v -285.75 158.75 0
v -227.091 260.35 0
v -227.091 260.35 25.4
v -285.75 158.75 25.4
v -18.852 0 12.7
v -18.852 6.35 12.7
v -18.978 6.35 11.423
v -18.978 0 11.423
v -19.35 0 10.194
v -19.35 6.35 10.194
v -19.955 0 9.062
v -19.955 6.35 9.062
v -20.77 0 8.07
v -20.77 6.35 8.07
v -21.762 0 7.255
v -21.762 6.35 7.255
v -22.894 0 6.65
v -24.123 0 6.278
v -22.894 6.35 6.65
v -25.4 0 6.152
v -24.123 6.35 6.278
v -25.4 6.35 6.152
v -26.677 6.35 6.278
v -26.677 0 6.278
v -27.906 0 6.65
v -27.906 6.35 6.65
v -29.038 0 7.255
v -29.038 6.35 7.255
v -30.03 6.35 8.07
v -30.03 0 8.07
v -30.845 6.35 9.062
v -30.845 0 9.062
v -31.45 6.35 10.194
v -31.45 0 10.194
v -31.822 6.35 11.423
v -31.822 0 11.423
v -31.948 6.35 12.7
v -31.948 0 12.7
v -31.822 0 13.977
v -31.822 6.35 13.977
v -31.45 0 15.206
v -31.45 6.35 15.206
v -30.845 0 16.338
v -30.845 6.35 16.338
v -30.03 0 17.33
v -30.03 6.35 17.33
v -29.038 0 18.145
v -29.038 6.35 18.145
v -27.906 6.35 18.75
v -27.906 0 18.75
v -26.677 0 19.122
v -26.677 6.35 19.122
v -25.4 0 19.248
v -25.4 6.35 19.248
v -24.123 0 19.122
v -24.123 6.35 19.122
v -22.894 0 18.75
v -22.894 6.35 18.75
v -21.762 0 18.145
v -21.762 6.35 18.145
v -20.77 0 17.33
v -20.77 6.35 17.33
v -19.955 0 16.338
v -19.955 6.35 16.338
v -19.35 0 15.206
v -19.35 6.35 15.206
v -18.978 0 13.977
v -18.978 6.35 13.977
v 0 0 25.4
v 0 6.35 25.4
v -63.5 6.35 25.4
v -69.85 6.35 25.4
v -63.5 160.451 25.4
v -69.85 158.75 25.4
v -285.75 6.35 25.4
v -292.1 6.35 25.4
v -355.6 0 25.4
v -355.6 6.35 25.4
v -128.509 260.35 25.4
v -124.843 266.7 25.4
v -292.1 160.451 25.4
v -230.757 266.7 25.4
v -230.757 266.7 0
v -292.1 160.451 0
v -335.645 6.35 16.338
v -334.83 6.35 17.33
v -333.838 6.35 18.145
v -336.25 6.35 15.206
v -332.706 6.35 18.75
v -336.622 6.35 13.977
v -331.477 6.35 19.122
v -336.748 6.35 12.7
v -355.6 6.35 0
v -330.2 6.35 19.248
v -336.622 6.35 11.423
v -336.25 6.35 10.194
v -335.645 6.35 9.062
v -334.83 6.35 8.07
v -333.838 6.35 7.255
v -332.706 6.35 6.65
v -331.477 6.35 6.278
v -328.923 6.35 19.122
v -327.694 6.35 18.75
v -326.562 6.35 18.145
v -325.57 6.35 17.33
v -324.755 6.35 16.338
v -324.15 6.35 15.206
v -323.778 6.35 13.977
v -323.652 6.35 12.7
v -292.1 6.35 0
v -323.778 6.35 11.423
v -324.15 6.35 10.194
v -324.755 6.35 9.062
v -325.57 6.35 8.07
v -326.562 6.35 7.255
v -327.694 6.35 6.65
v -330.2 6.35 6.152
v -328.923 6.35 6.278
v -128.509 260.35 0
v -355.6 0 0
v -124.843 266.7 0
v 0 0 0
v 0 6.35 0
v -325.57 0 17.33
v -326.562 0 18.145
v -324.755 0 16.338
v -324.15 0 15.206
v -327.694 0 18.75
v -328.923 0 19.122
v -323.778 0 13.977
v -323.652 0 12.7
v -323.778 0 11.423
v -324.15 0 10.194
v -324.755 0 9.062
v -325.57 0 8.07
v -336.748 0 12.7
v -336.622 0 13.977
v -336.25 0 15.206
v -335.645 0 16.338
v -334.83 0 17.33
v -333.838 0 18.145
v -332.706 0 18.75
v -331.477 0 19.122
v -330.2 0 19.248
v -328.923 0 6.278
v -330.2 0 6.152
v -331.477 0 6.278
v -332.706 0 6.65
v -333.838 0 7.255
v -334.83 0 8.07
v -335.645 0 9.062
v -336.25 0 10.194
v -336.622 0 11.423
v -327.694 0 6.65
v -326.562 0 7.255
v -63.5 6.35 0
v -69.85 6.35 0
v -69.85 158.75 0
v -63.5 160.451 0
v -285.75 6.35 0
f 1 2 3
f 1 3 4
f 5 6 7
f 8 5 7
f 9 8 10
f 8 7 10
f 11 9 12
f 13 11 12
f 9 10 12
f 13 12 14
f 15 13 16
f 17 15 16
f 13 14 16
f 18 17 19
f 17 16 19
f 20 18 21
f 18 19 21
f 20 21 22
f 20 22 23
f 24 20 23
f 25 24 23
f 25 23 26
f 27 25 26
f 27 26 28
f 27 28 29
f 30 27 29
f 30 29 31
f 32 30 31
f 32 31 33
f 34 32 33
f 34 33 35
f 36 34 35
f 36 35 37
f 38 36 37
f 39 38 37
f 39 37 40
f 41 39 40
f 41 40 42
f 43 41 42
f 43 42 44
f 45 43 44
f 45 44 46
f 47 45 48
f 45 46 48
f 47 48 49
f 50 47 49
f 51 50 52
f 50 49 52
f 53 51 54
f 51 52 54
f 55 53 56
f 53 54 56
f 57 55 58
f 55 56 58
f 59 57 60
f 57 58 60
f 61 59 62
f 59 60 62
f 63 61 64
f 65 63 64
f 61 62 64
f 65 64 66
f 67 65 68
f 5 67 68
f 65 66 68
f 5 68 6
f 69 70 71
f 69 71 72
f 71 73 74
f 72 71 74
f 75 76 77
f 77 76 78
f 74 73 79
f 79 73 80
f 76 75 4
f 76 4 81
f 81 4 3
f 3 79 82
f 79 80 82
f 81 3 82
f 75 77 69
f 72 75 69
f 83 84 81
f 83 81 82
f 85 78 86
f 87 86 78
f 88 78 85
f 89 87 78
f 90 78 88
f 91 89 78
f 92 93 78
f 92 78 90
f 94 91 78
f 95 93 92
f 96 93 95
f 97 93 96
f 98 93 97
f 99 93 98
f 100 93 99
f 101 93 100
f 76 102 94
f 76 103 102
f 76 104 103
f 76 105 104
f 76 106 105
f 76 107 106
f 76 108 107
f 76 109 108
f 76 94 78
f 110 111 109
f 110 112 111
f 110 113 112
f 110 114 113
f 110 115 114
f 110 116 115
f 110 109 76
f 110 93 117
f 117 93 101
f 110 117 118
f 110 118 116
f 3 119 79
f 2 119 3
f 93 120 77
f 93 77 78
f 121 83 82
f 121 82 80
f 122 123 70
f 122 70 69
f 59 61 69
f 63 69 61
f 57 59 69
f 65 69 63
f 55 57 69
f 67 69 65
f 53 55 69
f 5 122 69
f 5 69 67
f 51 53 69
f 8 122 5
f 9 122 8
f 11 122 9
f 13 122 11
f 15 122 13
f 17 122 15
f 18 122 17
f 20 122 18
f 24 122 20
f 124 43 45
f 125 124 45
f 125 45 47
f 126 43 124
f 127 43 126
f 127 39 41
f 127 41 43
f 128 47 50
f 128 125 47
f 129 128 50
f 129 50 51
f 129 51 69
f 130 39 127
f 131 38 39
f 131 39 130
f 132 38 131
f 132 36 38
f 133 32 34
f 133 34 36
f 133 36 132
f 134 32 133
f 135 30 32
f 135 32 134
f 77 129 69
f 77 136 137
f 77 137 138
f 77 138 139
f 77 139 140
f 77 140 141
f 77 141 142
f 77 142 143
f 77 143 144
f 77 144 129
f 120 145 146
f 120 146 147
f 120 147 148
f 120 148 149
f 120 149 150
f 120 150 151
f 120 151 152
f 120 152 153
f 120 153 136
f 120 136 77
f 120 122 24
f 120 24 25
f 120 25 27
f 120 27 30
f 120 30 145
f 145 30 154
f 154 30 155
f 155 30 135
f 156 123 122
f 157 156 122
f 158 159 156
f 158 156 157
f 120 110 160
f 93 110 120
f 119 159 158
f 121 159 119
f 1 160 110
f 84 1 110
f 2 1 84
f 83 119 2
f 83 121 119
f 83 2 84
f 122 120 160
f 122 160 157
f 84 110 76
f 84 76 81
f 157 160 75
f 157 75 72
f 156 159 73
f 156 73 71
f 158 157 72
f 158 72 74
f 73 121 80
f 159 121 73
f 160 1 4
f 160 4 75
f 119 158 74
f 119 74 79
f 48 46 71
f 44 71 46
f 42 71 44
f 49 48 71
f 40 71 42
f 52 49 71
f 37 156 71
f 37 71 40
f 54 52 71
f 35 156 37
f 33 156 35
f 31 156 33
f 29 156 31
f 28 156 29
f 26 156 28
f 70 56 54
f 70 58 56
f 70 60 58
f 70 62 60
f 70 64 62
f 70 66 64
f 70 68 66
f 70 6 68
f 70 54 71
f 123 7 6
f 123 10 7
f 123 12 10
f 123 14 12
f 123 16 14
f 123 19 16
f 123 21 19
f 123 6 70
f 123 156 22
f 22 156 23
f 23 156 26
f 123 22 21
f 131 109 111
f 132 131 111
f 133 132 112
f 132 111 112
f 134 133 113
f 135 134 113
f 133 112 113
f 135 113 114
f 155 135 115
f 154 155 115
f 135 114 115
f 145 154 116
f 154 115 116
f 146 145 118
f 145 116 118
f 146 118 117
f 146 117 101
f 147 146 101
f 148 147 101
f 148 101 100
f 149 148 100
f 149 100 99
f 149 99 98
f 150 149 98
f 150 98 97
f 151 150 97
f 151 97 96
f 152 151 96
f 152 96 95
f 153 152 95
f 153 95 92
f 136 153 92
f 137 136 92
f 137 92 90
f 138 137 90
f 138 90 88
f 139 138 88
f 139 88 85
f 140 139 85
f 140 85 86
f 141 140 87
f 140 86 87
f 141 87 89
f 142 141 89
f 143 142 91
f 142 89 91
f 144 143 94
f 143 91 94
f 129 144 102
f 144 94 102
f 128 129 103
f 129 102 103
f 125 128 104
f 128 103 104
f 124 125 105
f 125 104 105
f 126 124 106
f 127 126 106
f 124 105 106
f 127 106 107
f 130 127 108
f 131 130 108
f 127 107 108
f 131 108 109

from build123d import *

# Parameters (mm, degrees)
BOSS_EXTRUDE1_DEPTH         = 25.4
F_1_2_CLEARANCE_HOLE1_D     = 13.09624
F_1_2_CLEARANCE_HOLE1_DEPTH = 76.2
F_1_2_CLEARANCE_HOLE1_TIP   = 3.934507437


with BuildPart() as part:
    # Sketch1 → Boss-Extrude1 (new body)
    with BuildSketch(Plane.XY):
        Polygon((0, 0), (-355.6, 0), (-355.6, 6.35), (-292.1, 6.35), (-292.1, 160.451477372), (-230.75738686, 266.7), (-124.84261314, 266.7), (-63.5, 160.451477372), (-63.5, 6.35), (0, 6.35), align=None)
        Polygon((-285.75, 158.75), (-285.75, 6.35), (-69.85, 6.35), (-69.85, 158.75), (-128.50878735, 260.35), (-227.09121265, 260.35), align=None, mode=Mode.SUBTRACT)
    extrude(amount=BOSS_EXTRUDE1_DEPTH)

    # 1/2 Clearance Hole1
    with Locations(Plane(origin=(0, 0, 0), x_dir=(-1, 0, 0), z_dir=(0, -1, 0))):
        with Locations((25.4, -12.7), (330.2, -12.7)):
            Hole(F_1_2_CLEARANCE_HOLE1_D / 2, depth=F_1_2_CLEARANCE_HOLE1_DEPTH)
            with Locations((0, 0, -(F_1_2_CLEARANCE_HOLE1_DEPTH + F_1_2_CLEARANCE_HOLE1_TIP / 2))):  # 118° drill point
                Cone(0, F_1_2_CLEARANCE_HOLE1_D / 2, F_1_2_CLEARANCE_HOLE1_TIP, mode=Mode.SUBTRACT)


solid = part.part
